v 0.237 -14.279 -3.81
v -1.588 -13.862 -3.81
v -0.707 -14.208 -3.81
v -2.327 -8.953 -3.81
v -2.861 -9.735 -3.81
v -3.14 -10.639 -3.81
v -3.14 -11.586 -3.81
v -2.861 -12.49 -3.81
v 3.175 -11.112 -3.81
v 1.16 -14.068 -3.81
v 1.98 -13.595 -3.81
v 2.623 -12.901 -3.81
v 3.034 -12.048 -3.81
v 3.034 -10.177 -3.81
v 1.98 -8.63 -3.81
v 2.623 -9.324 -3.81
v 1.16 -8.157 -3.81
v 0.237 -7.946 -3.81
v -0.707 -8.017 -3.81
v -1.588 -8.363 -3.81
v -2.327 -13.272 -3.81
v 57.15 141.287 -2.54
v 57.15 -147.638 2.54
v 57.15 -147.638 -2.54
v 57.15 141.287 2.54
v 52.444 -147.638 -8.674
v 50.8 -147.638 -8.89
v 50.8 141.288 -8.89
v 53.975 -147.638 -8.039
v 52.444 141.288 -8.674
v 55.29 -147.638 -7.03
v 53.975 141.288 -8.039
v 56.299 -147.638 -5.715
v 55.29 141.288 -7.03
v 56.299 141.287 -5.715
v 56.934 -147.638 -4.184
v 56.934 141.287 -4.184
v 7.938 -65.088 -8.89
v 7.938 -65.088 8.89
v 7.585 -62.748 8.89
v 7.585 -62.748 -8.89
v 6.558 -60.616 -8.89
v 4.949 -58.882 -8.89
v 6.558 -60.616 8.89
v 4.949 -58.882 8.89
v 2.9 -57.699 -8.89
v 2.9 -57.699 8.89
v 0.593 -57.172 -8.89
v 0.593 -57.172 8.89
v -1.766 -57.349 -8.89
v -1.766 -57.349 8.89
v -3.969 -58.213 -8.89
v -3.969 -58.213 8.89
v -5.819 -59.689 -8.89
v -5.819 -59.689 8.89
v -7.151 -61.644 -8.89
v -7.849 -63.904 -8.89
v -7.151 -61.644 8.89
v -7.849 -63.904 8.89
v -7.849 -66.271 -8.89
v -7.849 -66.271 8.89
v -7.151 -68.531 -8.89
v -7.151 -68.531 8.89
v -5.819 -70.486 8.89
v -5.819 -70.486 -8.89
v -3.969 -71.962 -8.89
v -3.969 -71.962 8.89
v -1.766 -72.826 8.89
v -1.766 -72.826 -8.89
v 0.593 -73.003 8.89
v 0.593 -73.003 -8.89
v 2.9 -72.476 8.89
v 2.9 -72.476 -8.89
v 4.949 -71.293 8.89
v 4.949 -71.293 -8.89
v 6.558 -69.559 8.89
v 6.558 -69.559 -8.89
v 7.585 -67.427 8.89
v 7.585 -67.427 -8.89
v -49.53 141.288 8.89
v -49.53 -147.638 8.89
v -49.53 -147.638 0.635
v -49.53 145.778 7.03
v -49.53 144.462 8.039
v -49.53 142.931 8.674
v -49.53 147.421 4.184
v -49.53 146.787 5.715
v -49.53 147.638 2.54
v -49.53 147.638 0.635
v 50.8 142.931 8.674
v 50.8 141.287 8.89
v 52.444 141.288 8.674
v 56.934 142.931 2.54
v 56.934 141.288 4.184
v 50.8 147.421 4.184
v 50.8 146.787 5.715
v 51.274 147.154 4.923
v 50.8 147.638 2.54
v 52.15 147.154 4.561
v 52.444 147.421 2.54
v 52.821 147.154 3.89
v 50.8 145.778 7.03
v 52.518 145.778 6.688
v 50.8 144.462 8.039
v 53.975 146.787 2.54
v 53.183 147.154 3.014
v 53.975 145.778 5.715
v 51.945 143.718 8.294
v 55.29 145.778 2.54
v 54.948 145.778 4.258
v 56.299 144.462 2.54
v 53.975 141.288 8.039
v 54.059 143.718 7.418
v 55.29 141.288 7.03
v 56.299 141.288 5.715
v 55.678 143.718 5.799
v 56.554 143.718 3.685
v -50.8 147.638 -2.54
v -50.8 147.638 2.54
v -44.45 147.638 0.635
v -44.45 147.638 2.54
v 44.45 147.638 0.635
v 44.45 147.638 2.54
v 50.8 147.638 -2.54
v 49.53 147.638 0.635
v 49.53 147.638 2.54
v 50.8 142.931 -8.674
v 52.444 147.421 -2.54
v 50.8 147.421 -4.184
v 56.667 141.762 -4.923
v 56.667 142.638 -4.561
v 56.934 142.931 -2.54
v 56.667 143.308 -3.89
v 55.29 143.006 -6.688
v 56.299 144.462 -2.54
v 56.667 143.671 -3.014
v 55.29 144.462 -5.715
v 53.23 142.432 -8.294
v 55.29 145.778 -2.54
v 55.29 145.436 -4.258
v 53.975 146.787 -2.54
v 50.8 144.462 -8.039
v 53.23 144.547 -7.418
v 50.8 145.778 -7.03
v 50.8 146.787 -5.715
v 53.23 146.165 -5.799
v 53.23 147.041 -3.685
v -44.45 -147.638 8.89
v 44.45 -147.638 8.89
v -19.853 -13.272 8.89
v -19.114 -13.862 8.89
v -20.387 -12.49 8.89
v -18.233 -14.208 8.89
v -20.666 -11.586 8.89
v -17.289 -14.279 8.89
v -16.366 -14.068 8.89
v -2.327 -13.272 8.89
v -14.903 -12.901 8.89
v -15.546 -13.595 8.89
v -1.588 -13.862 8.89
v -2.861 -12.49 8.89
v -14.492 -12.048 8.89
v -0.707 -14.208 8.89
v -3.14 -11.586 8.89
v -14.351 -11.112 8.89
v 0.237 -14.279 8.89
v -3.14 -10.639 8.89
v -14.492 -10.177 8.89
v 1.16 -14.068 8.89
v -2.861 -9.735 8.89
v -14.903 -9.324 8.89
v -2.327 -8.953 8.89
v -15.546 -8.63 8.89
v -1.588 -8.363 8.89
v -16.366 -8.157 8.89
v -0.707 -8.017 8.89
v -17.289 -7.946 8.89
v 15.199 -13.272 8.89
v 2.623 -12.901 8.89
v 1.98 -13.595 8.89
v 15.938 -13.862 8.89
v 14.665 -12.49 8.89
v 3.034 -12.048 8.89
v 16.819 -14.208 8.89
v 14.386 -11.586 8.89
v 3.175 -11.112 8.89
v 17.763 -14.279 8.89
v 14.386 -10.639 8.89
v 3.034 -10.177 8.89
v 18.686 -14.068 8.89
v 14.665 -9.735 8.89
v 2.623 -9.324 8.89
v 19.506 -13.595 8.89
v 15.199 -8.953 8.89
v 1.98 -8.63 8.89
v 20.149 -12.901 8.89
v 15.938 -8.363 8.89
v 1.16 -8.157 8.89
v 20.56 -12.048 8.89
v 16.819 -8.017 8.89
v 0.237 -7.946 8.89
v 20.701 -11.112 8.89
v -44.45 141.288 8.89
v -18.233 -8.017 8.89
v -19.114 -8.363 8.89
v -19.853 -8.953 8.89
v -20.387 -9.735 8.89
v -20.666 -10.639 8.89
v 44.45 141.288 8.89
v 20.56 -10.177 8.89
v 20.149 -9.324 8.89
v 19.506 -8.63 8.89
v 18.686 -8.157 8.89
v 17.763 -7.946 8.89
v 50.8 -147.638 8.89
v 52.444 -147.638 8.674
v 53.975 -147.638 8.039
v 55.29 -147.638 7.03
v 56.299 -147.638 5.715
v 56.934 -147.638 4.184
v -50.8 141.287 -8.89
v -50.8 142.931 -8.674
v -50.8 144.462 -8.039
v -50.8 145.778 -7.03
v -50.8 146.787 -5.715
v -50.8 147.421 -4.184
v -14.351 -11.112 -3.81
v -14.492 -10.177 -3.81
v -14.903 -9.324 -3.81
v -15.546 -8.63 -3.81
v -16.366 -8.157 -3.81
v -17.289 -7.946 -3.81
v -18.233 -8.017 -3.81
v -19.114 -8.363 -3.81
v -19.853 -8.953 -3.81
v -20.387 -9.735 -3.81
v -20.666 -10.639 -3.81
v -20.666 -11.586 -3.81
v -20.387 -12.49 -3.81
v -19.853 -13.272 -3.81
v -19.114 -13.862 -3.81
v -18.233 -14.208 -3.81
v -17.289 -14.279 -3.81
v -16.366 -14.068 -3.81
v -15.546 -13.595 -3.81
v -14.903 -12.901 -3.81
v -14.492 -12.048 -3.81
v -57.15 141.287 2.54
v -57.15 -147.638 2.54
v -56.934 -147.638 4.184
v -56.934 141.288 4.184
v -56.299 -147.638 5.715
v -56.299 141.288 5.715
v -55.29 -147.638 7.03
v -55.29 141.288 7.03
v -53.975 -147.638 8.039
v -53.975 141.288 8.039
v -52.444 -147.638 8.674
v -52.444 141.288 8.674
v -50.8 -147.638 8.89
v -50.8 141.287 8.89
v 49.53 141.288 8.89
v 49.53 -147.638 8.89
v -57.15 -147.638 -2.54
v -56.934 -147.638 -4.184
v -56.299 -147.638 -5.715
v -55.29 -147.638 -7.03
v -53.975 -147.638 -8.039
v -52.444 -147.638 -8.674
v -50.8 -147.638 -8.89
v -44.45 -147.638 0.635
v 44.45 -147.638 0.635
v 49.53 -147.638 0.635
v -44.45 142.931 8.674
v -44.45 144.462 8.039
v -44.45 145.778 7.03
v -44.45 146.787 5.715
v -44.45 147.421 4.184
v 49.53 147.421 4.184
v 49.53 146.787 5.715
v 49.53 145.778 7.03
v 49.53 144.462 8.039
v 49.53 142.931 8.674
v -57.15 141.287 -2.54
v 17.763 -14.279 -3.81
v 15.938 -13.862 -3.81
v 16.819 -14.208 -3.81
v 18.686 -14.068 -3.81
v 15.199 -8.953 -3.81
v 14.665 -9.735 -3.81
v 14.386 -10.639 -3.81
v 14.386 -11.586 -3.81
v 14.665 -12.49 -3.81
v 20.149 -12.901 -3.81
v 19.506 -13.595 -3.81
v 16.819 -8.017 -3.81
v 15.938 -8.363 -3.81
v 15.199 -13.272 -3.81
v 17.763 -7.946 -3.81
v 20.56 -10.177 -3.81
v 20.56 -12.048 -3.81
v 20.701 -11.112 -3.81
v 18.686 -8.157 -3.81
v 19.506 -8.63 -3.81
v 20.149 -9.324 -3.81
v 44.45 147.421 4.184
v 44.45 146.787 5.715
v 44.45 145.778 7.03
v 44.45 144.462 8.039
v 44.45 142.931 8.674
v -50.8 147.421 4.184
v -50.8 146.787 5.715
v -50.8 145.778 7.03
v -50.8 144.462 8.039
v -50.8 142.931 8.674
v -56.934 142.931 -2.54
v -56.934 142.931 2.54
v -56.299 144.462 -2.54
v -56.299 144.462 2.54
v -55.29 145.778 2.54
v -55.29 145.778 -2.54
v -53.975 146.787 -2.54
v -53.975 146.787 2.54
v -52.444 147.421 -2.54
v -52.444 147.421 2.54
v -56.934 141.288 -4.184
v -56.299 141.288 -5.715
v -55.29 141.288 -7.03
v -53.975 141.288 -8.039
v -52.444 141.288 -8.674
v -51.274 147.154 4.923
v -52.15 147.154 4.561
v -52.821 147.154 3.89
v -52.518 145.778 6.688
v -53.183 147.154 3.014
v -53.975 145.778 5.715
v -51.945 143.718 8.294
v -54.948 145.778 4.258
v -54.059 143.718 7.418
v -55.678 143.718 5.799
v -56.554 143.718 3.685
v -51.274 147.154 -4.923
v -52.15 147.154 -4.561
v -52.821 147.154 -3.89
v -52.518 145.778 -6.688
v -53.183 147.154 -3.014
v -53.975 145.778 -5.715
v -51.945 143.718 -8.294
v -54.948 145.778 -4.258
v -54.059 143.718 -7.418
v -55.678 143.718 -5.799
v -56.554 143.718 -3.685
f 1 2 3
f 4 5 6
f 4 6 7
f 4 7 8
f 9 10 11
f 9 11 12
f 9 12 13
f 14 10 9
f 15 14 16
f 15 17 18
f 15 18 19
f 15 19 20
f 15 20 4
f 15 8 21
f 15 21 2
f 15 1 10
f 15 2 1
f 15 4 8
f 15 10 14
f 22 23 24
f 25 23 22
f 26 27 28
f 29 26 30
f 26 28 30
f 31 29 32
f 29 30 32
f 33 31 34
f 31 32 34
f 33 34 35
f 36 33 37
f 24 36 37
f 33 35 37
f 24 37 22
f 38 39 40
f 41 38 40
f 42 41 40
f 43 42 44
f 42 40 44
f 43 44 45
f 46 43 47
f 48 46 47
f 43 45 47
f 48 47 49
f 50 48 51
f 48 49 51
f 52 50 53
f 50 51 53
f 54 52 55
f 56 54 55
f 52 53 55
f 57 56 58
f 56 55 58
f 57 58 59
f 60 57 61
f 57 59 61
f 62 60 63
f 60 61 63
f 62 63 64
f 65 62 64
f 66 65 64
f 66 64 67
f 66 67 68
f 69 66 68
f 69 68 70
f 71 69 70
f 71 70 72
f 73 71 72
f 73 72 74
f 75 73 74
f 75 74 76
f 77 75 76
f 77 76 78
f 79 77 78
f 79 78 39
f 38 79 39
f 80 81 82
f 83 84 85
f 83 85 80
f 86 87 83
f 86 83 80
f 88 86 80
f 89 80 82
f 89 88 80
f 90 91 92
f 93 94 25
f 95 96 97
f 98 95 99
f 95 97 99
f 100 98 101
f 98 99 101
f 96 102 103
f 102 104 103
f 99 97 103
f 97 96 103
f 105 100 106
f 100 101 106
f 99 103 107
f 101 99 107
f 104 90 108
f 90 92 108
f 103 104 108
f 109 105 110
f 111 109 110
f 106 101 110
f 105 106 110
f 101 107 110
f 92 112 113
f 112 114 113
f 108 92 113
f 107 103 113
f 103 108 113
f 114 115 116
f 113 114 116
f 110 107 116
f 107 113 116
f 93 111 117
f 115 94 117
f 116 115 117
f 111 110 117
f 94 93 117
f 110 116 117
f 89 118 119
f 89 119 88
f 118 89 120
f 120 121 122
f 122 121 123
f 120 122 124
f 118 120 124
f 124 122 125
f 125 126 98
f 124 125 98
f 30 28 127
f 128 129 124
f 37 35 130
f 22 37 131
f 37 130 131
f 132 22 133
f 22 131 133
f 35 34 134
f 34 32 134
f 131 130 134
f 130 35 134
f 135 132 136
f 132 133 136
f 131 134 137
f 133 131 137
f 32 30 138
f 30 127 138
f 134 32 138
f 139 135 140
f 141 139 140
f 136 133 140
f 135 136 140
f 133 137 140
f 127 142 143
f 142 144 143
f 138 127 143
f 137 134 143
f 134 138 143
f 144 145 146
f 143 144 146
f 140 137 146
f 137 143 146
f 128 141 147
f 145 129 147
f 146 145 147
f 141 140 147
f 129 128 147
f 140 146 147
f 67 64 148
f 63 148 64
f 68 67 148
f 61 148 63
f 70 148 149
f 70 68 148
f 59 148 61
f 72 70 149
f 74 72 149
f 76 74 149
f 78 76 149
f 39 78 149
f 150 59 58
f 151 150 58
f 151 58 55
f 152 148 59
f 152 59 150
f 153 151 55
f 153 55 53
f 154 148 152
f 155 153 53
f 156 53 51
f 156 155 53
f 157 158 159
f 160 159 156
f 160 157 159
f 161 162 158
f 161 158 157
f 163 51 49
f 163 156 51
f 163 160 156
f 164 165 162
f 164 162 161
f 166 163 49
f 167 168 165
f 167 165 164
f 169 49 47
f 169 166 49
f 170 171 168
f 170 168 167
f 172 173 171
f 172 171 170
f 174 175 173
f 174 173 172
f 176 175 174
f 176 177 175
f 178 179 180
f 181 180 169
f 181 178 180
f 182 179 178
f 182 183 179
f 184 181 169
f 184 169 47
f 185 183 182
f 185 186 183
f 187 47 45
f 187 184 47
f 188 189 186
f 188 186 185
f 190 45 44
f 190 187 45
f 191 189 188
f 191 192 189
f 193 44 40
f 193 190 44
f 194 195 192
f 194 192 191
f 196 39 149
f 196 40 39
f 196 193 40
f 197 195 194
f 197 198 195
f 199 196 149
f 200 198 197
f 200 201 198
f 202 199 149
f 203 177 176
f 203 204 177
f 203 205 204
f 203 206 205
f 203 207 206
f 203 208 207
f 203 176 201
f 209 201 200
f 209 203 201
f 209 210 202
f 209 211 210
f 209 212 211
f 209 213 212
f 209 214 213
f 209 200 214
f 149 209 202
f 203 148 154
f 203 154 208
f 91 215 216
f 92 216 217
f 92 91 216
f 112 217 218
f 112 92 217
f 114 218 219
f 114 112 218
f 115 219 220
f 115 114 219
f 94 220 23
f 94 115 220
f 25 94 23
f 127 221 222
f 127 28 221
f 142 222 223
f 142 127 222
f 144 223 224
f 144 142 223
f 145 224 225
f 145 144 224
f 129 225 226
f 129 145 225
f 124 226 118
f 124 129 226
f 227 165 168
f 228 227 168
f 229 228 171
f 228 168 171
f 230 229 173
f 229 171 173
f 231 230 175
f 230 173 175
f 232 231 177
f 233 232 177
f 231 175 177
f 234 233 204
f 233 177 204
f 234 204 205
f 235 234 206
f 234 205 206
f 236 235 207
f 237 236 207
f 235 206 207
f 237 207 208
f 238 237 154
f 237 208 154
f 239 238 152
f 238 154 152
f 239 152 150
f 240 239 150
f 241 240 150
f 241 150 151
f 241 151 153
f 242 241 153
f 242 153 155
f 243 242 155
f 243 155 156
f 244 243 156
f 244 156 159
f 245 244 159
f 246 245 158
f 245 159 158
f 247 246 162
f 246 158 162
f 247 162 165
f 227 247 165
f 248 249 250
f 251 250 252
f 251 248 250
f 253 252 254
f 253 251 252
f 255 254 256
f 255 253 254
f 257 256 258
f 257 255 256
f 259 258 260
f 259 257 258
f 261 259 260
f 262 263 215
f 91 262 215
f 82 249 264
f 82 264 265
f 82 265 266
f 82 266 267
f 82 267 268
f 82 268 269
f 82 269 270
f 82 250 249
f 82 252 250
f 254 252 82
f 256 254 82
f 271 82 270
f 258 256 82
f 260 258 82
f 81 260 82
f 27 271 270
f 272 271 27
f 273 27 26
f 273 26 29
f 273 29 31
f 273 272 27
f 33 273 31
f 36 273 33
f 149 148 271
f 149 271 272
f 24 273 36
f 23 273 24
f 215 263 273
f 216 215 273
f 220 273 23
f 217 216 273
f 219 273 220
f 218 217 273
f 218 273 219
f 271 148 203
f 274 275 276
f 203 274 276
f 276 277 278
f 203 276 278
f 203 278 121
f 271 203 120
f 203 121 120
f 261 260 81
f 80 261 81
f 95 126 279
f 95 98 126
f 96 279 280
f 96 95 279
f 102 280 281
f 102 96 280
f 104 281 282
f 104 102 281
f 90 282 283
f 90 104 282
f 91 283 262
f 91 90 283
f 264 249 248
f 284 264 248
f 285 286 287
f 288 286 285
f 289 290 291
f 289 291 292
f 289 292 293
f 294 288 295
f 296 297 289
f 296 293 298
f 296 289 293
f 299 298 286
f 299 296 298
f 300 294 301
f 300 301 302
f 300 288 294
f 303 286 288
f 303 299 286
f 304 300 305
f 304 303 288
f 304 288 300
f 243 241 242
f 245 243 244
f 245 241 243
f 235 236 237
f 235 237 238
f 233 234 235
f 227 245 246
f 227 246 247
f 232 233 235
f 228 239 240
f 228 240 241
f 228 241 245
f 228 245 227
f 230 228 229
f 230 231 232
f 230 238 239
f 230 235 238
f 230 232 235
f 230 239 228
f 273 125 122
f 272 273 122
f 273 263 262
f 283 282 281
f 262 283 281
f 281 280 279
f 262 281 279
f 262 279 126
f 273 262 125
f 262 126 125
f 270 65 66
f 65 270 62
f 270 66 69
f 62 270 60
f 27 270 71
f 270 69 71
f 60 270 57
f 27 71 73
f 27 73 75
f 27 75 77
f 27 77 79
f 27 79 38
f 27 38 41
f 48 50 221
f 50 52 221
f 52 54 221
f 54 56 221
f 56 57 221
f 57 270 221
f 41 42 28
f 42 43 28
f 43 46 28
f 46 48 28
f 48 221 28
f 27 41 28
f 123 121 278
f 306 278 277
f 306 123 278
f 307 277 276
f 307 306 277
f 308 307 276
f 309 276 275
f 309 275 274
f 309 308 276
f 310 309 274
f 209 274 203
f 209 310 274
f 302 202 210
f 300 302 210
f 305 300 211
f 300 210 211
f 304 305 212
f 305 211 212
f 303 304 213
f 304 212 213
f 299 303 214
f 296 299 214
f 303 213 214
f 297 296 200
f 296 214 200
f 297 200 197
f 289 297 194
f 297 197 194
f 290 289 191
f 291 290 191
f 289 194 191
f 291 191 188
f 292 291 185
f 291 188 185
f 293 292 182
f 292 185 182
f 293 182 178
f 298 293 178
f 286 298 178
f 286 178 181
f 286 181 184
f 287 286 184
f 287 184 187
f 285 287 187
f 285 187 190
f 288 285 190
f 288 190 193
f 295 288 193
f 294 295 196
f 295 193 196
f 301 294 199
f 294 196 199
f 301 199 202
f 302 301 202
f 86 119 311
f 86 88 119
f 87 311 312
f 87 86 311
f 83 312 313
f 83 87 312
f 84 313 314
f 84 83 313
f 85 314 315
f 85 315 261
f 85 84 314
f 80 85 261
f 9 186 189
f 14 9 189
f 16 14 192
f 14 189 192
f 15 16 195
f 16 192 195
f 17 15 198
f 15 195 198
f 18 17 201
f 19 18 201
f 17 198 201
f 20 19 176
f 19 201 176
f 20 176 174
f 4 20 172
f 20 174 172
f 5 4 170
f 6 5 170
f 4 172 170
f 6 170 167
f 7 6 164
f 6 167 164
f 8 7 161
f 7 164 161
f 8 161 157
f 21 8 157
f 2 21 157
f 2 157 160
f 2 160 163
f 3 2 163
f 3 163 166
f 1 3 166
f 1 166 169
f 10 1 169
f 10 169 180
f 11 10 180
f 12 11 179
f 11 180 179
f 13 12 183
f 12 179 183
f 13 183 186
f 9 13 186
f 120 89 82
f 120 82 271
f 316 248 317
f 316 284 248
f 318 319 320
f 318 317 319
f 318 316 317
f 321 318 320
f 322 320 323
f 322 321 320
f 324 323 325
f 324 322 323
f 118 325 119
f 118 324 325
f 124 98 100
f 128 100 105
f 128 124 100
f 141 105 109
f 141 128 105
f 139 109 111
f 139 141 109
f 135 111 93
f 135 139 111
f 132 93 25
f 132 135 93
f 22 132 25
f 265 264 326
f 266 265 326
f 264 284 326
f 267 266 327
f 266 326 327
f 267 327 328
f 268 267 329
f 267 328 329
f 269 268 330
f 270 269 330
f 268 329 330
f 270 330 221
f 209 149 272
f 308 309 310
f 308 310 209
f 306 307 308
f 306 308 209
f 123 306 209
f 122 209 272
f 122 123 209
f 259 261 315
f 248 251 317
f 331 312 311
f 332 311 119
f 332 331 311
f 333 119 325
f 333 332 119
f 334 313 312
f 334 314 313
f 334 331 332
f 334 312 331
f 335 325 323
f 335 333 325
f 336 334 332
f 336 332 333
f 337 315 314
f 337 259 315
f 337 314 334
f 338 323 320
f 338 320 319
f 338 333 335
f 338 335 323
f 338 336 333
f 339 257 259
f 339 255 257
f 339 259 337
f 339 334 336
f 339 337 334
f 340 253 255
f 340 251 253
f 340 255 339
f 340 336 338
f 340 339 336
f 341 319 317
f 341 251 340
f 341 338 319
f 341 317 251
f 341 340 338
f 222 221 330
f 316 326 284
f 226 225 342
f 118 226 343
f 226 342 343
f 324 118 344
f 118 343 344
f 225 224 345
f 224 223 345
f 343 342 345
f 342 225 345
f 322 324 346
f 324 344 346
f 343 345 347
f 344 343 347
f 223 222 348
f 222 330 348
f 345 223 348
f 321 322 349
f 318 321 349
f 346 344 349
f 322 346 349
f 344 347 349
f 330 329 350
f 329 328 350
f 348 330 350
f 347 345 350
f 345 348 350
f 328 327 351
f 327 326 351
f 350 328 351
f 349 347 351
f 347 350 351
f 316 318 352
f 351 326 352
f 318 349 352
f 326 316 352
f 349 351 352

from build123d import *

# Parameters (mm, degrees)
SKETCH1_W           = 114.3
SKETCH1_H           = 295.275
BOSS_EXTRUDE1_DEPTH = 8.89
SKETCH2_R           = 3.175
CUT_EXTRUDE1_DEPTH  = 12.7
SKETCH3_W           = 5.08
SKETCH3_H           = 8.255
CUT_EXTRUDE2_DEPTH  = 296.275
FILLET1_R           = 6.35
SKETCH5_R           = 7.9375
CUT_EXTRUDE4_DEPTH  = 18.78


with BuildPart() as part:
    # Sketch1 → Boss-Extrude1 (new body, symmetric)
    with BuildSketch(Plane.XY):
        Rectangle(SKETCH1_W, SKETCH1_H)
    extrude(amount=BOSS_EXTRUDE1_DEPTH, both=True)

    # Sketch2 → Cut-Extrude1 (cut)
    with BuildSketch(Plane.XY.offset(8.89)):
        with Locations((0, -11.1125)):
            Circle(SKETCH2_R)
        with Locations((-17.526, -11.1125)):
            Circle(SKETCH2_R)
        with Locations((17.526, -11.1125)):
            Circle(SKETCH2_R)
    extrude(amount=-CUT_EXTRUDE1_DEPTH, mode=Mode.SUBTRACT)

    # Sketch3 → Cut-Extrude2 (cut, through all)
    with BuildSketch(Plane(origin=(0, 147.6375, 0), x_dir=(1, 0, 0), z_dir=(0, 1, 0))):
        with Locations((-46.99, -4.7625)):
            Rectangle(SKETCH3_W, SKETCH3_H)
    cut_extrude2 = extrude(amount=-CUT_EXTRUDE2_DEPTH, mode=Mode.SUBTRACT)

    # Mirror1: Cut-Extrude2 across plane
    add(cut_extrude2.mirror(Plane(origin=(0, 0, 0), x_dir=(0, 0, 1), z_dir=(1, 0, 0))), mode=Mode.SUBTRACT)

    # Fillet1
    fillet1_edges = [part.edges().sort_by_distance(p)[0] for p in [
        (-57.15, 0, 8.89),
        (-53.34, 147.6375, 8.89),
        (57.15, 0, 8.89),
        (0, 147.6375, 8.89),
        (-57.15, 0, -8.89),
        (0, 147.6375, -8.89),
        (57.15, 0, -8.89),
        (53.34, 147.6375, 8.89),
        (-57.15, 147.6375, 0),
        (57.15, 147.6375, 0),
    ]]
    fillet(fillet1_edges, radius=FILLET1_R)

    # Sketch5 → Cut-Extrude4 (cut, through all)
    with BuildSketch(Plane.XY.offset(8.89)):
        with Locations((0, -65.0875)):
            Circle(SKETCH5_R)
    extrude(amount=-CUT_EXTRUDE4_DEPTH, mode=Mode.SUBTRACT)


solid = part.part
